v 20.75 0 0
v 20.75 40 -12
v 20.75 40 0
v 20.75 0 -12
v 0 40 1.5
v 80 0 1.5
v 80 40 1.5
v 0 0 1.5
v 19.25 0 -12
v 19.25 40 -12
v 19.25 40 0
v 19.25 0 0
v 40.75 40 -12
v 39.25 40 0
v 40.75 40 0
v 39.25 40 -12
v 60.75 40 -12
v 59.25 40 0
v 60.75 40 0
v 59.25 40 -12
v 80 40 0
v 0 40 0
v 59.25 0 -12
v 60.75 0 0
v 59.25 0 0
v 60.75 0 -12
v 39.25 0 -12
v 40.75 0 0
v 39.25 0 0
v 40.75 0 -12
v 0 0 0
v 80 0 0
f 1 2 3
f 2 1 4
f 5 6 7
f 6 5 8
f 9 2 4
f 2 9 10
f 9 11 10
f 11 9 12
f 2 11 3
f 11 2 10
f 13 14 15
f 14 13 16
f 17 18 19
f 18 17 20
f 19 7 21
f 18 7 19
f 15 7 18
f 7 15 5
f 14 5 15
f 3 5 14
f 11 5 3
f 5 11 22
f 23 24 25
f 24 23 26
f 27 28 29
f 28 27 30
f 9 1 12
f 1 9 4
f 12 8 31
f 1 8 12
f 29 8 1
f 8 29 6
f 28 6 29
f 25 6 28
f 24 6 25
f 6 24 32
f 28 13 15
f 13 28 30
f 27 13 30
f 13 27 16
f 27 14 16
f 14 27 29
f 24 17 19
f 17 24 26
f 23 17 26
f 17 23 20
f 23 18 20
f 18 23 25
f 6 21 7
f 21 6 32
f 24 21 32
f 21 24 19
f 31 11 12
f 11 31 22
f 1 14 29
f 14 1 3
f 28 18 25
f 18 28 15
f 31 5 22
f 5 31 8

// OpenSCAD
$fn = 32;

// ----------------------------------------------------------------------
// Ribbed panel: 1.5 mm panel
// ----------------------------------------------------------------------

// --- parameters (mm) ---
panel_l = 80;             // panel length, X
panel_w = 40;             // panel width, Y
panel_t = 1.5;            // panel thickness, Z
rib_t = 1.5;              // rib thickness
rib_h = 12;               // rib height below the panel
ribs = 3;                 // number of ribs

total_h = panel_t + rib_h;  // overall height

union() {
  cube([panel_l, panel_w, panel_t]);
  for (i = [1 : ribs])
    translate([i * panel_l / (ribs + 1) - rib_t / 2, 0, -rib_h])
      cube([rib_t, panel_w, rib_h + panel_t]);
}
